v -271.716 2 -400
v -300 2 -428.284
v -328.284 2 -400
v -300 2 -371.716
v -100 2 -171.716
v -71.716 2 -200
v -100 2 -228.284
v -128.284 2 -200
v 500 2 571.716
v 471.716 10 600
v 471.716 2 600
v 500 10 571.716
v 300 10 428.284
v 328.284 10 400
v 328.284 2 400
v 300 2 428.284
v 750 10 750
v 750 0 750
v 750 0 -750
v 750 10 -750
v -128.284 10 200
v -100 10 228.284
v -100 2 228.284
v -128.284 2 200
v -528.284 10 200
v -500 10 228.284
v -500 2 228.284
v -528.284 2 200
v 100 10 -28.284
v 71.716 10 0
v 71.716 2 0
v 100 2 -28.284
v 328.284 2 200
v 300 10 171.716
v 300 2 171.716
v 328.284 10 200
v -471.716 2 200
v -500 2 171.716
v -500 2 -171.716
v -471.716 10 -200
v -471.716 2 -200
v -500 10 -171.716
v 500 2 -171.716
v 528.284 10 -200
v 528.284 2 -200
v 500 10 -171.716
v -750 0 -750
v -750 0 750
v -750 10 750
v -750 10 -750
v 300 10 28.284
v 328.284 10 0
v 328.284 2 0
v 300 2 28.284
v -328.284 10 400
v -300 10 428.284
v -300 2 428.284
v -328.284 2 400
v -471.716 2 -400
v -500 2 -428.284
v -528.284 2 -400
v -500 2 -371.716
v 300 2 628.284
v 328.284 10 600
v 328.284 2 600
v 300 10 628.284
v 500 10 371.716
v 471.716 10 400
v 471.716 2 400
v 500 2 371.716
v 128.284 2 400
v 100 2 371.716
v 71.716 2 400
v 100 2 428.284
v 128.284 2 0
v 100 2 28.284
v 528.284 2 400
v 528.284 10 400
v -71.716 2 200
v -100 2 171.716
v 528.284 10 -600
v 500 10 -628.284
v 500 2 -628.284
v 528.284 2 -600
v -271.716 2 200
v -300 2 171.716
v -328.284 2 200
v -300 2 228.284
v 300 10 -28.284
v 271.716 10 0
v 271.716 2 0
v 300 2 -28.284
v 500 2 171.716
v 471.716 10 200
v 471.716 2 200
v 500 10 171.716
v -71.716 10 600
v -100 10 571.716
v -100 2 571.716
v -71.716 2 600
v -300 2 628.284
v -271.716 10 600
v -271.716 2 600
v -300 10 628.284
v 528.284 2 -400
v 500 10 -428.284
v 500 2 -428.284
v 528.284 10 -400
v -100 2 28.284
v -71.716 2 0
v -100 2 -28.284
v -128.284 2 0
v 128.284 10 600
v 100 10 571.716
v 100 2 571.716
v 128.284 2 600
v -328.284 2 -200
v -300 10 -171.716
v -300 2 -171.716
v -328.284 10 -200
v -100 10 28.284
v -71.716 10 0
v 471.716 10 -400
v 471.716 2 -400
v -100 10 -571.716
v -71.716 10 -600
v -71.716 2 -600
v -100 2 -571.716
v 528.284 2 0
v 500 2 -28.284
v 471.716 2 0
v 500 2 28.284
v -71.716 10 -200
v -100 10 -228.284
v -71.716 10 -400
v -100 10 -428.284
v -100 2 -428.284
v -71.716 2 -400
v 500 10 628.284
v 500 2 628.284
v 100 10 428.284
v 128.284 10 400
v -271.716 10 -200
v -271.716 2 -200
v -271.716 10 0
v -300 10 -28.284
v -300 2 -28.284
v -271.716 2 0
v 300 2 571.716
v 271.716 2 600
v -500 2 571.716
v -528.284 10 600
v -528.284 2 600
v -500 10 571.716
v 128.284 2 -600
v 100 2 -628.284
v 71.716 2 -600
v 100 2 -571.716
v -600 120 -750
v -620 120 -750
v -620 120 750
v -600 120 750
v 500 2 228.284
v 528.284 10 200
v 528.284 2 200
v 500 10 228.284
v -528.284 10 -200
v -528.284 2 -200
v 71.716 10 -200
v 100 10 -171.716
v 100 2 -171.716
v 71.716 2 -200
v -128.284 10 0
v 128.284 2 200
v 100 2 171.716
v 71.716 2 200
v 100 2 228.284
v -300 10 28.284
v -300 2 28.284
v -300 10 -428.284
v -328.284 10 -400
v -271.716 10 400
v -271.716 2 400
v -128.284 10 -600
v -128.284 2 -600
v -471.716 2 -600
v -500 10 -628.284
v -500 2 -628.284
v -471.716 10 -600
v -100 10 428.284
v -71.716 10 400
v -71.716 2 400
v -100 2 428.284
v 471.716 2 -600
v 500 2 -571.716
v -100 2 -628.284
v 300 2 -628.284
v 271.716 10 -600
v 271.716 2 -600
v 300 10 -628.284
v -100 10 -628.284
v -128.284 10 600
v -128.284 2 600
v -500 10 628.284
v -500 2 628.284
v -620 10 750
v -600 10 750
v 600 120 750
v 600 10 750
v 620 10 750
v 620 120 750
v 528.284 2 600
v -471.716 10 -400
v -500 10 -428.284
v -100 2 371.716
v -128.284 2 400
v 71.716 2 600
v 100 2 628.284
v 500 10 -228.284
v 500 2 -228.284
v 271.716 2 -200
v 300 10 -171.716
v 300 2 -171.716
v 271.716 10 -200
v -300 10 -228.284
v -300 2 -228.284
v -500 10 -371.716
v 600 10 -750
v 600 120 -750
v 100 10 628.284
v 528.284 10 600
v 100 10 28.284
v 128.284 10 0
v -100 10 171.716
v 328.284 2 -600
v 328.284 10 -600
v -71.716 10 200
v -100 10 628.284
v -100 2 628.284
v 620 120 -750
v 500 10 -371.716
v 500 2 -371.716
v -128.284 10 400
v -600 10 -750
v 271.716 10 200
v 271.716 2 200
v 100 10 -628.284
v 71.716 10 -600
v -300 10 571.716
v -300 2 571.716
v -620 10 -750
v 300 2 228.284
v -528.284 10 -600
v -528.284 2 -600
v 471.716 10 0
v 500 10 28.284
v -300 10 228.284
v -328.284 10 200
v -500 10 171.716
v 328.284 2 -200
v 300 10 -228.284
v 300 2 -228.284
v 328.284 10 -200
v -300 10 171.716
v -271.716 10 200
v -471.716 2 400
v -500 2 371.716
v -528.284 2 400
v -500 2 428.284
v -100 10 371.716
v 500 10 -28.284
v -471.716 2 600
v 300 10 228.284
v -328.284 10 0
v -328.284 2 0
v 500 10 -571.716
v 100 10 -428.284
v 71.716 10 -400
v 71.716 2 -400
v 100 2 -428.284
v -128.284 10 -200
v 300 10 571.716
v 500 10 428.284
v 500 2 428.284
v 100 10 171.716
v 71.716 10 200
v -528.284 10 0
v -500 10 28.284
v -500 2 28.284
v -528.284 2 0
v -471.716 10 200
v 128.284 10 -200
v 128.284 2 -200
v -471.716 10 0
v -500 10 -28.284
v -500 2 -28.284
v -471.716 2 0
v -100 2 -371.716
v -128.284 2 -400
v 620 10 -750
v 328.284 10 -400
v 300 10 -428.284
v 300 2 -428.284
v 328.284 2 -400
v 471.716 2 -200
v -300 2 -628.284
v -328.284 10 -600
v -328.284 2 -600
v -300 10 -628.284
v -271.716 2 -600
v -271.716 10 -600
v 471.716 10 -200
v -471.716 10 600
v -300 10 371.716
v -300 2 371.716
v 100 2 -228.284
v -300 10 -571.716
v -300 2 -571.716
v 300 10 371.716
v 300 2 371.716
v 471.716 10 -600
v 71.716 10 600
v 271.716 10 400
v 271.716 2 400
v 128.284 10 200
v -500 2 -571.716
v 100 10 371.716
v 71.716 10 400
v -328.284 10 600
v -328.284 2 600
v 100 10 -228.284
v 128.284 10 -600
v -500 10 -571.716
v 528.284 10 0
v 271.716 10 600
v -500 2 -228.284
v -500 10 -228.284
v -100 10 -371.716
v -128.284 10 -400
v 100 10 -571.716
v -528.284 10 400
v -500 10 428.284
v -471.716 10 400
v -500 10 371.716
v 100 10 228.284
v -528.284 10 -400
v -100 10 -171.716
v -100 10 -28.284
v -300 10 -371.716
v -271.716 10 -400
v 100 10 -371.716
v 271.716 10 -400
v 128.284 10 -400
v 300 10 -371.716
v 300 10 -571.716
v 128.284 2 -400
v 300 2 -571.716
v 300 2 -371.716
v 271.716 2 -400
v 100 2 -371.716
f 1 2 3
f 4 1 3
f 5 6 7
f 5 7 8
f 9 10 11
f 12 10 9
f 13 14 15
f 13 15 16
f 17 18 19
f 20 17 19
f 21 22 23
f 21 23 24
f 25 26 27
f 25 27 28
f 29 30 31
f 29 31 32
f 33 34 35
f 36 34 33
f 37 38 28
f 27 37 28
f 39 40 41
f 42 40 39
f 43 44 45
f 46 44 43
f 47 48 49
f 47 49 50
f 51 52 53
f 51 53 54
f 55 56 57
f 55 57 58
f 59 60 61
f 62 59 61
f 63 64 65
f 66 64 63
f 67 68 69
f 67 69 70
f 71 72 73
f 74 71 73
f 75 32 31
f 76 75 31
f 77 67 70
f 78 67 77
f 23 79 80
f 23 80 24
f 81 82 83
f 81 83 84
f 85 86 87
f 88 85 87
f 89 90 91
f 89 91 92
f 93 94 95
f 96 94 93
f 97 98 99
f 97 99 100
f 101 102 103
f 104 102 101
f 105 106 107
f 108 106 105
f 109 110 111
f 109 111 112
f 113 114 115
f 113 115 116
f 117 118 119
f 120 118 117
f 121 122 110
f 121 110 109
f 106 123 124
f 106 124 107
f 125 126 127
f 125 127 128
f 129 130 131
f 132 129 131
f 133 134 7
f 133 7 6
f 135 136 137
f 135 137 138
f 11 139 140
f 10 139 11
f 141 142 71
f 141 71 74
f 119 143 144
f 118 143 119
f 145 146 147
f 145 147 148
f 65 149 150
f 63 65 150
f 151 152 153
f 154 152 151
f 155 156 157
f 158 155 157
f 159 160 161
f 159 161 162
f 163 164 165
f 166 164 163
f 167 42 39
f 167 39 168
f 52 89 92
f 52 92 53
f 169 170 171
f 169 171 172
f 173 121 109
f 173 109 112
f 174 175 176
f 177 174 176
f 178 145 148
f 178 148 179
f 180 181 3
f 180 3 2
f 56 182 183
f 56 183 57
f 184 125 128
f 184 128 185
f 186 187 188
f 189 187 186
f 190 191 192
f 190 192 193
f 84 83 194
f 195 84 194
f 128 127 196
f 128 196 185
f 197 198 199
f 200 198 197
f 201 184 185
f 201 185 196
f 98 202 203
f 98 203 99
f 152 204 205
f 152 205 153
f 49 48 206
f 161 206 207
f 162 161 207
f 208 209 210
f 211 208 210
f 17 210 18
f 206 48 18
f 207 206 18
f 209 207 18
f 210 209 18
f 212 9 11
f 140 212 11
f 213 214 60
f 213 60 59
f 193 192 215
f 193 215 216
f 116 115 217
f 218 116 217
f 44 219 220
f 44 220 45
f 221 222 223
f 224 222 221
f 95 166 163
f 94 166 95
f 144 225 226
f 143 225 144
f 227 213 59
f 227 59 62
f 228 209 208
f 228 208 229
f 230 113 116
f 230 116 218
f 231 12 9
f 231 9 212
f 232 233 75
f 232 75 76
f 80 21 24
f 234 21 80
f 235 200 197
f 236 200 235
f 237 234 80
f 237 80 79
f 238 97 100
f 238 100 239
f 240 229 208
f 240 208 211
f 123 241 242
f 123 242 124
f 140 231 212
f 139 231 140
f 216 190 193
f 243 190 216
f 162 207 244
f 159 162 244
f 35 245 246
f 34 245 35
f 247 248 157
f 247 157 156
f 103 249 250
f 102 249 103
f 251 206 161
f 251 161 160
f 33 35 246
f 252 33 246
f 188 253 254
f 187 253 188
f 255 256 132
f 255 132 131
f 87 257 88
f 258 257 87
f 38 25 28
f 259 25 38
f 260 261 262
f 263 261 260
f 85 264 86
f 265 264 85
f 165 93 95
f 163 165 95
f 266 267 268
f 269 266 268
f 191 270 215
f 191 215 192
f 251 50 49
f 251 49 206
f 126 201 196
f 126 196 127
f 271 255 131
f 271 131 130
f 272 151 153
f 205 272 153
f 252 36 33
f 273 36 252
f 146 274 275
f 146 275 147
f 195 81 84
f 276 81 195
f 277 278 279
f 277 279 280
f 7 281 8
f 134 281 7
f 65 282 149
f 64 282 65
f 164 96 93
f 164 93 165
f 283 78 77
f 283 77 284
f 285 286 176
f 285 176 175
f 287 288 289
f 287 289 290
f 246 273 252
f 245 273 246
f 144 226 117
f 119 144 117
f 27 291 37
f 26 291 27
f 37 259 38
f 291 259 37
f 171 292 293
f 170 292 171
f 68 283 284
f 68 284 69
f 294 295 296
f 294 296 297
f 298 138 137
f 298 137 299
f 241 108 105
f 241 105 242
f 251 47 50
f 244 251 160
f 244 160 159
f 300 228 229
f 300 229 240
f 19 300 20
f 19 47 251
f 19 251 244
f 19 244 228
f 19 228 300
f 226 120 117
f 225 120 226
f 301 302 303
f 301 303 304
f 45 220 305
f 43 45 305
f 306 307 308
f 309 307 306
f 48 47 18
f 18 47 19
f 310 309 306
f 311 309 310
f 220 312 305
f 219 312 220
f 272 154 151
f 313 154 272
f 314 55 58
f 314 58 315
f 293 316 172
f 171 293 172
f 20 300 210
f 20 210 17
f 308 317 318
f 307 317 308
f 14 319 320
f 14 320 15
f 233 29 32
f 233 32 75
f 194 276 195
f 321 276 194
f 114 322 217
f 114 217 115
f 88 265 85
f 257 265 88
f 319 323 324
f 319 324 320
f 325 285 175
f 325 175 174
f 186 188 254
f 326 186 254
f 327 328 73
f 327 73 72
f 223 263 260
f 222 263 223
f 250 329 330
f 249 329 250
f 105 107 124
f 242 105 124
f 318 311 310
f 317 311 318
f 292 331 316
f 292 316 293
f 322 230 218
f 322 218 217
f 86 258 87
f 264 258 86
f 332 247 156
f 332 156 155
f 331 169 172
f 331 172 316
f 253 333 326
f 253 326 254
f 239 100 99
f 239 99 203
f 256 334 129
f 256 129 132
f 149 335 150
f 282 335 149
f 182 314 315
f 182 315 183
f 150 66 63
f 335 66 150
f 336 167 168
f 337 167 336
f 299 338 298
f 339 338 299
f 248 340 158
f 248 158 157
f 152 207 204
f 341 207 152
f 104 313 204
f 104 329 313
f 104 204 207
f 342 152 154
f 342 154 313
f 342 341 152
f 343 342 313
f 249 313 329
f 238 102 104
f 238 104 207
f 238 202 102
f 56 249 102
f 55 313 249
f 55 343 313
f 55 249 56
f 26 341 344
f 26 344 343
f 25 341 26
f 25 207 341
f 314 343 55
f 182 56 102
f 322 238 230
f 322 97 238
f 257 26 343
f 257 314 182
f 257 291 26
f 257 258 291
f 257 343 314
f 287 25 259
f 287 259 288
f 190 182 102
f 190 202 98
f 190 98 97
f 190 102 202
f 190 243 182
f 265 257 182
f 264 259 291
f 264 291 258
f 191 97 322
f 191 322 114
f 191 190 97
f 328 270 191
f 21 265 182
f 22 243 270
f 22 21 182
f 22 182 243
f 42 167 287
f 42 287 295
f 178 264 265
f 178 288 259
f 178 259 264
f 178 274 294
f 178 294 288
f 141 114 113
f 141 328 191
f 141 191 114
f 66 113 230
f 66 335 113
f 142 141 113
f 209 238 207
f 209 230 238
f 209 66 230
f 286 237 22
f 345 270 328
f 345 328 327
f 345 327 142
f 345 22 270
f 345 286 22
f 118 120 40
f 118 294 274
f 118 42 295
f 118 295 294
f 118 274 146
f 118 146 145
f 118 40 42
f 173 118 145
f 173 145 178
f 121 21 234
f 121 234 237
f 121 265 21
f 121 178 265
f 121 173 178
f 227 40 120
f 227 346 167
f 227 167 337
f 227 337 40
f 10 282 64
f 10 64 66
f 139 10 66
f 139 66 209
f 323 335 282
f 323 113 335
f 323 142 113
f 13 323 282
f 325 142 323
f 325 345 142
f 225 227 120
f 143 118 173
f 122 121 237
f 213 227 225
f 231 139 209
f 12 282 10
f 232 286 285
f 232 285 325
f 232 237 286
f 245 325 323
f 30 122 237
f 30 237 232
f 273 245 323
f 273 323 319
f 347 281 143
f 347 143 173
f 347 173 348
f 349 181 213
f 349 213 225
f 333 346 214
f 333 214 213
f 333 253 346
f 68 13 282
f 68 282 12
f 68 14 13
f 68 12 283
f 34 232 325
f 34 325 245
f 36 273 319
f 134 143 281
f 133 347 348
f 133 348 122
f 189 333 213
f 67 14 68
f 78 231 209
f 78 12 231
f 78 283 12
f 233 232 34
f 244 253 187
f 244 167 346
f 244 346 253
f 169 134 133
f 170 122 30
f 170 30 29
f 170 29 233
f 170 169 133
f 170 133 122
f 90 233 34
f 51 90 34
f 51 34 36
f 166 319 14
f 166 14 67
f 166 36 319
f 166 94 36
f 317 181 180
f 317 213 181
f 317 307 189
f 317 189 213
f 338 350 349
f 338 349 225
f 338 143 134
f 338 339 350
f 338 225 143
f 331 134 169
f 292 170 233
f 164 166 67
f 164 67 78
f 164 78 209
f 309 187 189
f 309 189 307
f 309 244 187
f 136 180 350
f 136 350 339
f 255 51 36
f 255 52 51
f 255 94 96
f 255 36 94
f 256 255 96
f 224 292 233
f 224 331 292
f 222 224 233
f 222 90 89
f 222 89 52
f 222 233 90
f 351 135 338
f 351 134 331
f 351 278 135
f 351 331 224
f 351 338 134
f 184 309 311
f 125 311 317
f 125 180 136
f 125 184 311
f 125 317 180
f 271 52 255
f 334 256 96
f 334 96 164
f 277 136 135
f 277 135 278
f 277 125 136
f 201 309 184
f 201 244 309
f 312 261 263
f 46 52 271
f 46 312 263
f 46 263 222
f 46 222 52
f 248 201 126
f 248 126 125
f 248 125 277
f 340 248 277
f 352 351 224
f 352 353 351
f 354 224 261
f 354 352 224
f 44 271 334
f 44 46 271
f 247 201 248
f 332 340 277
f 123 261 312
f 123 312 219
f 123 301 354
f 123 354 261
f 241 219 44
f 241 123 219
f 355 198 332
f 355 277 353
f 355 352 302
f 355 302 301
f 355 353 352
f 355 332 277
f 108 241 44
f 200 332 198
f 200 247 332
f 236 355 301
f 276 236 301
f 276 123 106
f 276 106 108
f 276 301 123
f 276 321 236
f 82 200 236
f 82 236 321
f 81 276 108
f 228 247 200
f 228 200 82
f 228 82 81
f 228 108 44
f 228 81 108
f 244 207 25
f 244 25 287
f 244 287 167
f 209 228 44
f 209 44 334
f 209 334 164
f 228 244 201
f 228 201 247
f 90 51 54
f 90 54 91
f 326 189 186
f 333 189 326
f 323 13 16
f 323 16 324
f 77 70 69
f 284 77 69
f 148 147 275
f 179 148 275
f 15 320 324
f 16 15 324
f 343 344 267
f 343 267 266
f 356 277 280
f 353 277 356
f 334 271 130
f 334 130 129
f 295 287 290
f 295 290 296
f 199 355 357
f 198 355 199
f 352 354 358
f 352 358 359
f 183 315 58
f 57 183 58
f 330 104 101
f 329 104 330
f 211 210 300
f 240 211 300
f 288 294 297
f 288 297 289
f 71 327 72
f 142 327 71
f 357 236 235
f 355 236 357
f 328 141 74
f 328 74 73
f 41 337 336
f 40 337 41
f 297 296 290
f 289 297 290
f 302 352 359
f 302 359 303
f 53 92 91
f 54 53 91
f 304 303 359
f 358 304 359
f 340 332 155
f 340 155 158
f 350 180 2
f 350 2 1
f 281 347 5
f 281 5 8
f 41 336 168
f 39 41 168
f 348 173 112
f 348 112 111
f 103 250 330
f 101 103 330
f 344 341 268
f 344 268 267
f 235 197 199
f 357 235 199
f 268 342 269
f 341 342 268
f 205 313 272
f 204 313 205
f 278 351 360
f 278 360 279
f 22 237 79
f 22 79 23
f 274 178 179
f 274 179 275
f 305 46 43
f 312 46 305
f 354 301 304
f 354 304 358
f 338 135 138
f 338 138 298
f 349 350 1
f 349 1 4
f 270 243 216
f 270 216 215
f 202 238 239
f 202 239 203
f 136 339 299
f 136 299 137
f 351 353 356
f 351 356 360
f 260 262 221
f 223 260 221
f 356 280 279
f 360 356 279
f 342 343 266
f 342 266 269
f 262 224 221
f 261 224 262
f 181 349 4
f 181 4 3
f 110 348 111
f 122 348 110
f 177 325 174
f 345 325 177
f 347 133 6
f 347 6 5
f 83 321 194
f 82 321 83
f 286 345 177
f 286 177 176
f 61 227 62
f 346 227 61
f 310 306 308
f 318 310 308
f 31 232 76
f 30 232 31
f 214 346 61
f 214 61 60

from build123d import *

# Parameters (mm, degrees)
SKETCH2_W           = 1500
SKETCH2_H           = 1500
BOSS_EXTRUDE1_DEPTH = 10
SKETCH3_W           = 20
SKETCH3_H           = 1500
BOSS_EXTRUDE2_DEPTH = 110
CUT_EXTRUDE1_DEPTH  = 8


with BuildPart() as part:
    # Sketch2 → Boss-Extrude1 (new body)
    with BuildSketch(Plane(origin=(0, 0, 0), x_dir=(1, 0, 0), z_dir=(0, 1, 0))):
        Rectangle(SKETCH2_W, SKETCH2_H)
    extrude(amount=BOSS_EXTRUDE1_DEPTH)

    # Sketch3 → Boss-Extrude2 (add)
    with BuildSketch(Plane(origin=(0, 10, 0), x_dir=(1, 0, 0), z_dir=(0, 1, 0))):
        with Locations((-610, 0)):
            Rectangle(SKETCH3_W, SKETCH3_H)
        with Locations((610, 0)):
            Rectangle(SKETCH3_W, SKETCH3_H)
    extrude(amount=BOSS_EXTRUDE2_DEPTH)

    # Sketch4 → Cut-Extrude1 (cut)
    with BuildSketch(Plane(origin=(0, 10, 0), x_dir=(1, 0, 0), z_dir=(0, 1, 0))):
        Polygon((-500, 628.284271247), (-471.715728753, 600), (-500, 571.715728753), (-528.284271247, 600), align=None)
        Polygon((-300, 628.284271247), (-271.715728753, 600), (-300, 571.715728753), (-328.284271247, 600), align=None)
        Polygon((-100, 628.284271247), (-71.715728753, 600), (-100, 571.715728753), (-128.284271247, 600), align=None)
        Polygon((100, 628.284271247), (128.284271247, 600), (100, 571.715728753), (71.715728753, 600), align=None)
        Polygon((300, 628.284271247), (328.284271247, 600), (300, 571.715728753), (271.715728753, 600), align=None)
        Polygon((500, 628.284271247), (528.284271247, 600), (500, 571.715728753), (471.715728753, 600), align=None)
        Polygon((-300, 428.284271247), (-271.715728753, 400), (-300, 371.715728753), (-328.284271247, 400), align=None)
        Polygon((-100, 428.284271247), (-71.715728753, 400), (-100, 371.715728753), (-128.284271247, 400), align=None)
        Polygon((100, 428.284271247), (128.284271247, 400), (100, 371.715728753), (71.715728753, 400), align=None)
        Polygon((300, 428.284271247), (328.284271247, 400), (300, 371.715728753), (271.715728753, 400), align=None)
        Polygon((500, 428.284271247), (528.284271247, 400), (500, 371.715728753), (471.715728753, 400), align=None)
        Polygon((-300, 228.284271247), (-271.715728753, 200), (-300, 171.715728753), (-328.284271247, 200), align=None)
        Polygon((-100, 228.284271247), (-71.715728753, 200), (-100, 171.715728753), (-128.284271247, 200), align=None)
        Polygon((100, 228.284271247), (128.284271247, 200), (100, 171.715728753), (71.715728753, 200), align=None)
        Polygon((300, 228.284271247), (328.284271247, 200), (300, 171.715728753), (271.715728753, 200), align=None)
        Polygon((500, 228.284271247), (528.284271247, 200), (500, 171.715728753), (471.715728753, 200), align=None)
        Polygon((-300, 28.284271247), (-271.715728753, 0), (-300, -28.284271247), (-328.284271247, 0), align=None)
        Polygon((-100, 28.284271247), (-71.715728753, 0), (-100, -28.284271247), (-128.284271247, 0), align=None)
        Polygon((100, 28.284271247), (128.284271247, 0), (100, -28.284271247), (71.715728753, 0), align=None)
        Polygon((300, 28.284271247), (328.284271247, 0), (300, -28.284271247), (271.715728753, 0), align=None)
        Polygon((500, 28.284271247), (528.284271247, 0), (500, -28.284271247), (471.715728753, 0), align=None)
        Polygon((-300, -171.715728753), (-271.715728753, -200), (-300, -228.284271247), (-328.284271247, -200), align=None)
        Polygon((-100, -171.715728753), (-71.715728753, -200), (-100, -228.284271247), (-128.284271247, -200), align=None)
        Polygon((100, -171.715728753), (128.284271247, -200), (100, -228.284271247), (71.715728753, -200), align=None)
        Polygon((300, -171.715728753), (328.284271247, -200), (300, -228.284271247), (271.715728753, -200), align=None)
        Polygon((500, -171.715728753), (528.284271247, -200), (500, -228.284271247), (471.715728753, -200), align=None)
        Polygon((-300, -371.715728753), (-271.715728753, -400), (-300, -428.284271247), (-328.284271247, -400), align=None)
        Polygon((-100, -371.715728753), (-71.715728753, -400), (-100, -428.284271247), (-128.284271247, -400), align=None)
        Polygon((100, -371.715728753), (128.284271247, -400), (100, -428.284271247), (71.715728753, -400), align=None)
        Polygon((300, -371.715728753), (328.284271247, -400), (300, -428.284271247), (271.715728753, -400), align=None)
        Polygon((500, -371.715728753), (528.284271247, -400), (500, -428.284271247), (471.715728753, -400), align=None)
        Polygon((-500, 428.284271247), (-471.715728753, 400), (-500, 371.715728753), (-528.284271247, 400), align=None)
        Polygon((-500, 228.284271247), (-471.715728753, 200), (-500, 171.715728753), (-528.284271247, 200), align=None)
        Polygon((-500, 28.284271247), (-471.715728753, 0), (-500, -28.284271247), (-528.284271247, 0), align=None)
        Polygon((-500, -171.715728753), (-471.715728753, -200), (-500, -228.284271247), (-528.284271247, -200), align=None)
        Polygon((-500, -371.715728753), (-471.715728753, -400), (-500, -428.284271247), (-528.284271247, -400), align=None)
        Polygon((-500, -571.715728753), (-471.715728753, -600), (-500, -628.284271247), (-528.284271247, -600), align=None)
        Polygon((-300, -571.715728753), (-271.715728753, -600), (-300, -628.284271247), (-328.284271247, -600), align=None)
        Polygon((-100, -571.715728753), (-71.715728753, -600), (-100, -628.284271247), (-128.284271247, -600), align=None)
        Polygon((100, -571.715728753), (128.284271247, -600), (100, -628.284271247), (71.715728753, -600), align=None)
        Polygon((300, -571.715728753), (328.284271247, -600), (300, -628.284271247), (271.715728753, -600), align=None)
        Polygon((500, -571.715728753), (528.284271247, -600), (500, -628.284271247), (471.715728753, -600), align=None)
    extrude(amount=-CUT_EXTRUDE1_DEPTH, mode=Mode.SUBTRACT)


solid = part.part
